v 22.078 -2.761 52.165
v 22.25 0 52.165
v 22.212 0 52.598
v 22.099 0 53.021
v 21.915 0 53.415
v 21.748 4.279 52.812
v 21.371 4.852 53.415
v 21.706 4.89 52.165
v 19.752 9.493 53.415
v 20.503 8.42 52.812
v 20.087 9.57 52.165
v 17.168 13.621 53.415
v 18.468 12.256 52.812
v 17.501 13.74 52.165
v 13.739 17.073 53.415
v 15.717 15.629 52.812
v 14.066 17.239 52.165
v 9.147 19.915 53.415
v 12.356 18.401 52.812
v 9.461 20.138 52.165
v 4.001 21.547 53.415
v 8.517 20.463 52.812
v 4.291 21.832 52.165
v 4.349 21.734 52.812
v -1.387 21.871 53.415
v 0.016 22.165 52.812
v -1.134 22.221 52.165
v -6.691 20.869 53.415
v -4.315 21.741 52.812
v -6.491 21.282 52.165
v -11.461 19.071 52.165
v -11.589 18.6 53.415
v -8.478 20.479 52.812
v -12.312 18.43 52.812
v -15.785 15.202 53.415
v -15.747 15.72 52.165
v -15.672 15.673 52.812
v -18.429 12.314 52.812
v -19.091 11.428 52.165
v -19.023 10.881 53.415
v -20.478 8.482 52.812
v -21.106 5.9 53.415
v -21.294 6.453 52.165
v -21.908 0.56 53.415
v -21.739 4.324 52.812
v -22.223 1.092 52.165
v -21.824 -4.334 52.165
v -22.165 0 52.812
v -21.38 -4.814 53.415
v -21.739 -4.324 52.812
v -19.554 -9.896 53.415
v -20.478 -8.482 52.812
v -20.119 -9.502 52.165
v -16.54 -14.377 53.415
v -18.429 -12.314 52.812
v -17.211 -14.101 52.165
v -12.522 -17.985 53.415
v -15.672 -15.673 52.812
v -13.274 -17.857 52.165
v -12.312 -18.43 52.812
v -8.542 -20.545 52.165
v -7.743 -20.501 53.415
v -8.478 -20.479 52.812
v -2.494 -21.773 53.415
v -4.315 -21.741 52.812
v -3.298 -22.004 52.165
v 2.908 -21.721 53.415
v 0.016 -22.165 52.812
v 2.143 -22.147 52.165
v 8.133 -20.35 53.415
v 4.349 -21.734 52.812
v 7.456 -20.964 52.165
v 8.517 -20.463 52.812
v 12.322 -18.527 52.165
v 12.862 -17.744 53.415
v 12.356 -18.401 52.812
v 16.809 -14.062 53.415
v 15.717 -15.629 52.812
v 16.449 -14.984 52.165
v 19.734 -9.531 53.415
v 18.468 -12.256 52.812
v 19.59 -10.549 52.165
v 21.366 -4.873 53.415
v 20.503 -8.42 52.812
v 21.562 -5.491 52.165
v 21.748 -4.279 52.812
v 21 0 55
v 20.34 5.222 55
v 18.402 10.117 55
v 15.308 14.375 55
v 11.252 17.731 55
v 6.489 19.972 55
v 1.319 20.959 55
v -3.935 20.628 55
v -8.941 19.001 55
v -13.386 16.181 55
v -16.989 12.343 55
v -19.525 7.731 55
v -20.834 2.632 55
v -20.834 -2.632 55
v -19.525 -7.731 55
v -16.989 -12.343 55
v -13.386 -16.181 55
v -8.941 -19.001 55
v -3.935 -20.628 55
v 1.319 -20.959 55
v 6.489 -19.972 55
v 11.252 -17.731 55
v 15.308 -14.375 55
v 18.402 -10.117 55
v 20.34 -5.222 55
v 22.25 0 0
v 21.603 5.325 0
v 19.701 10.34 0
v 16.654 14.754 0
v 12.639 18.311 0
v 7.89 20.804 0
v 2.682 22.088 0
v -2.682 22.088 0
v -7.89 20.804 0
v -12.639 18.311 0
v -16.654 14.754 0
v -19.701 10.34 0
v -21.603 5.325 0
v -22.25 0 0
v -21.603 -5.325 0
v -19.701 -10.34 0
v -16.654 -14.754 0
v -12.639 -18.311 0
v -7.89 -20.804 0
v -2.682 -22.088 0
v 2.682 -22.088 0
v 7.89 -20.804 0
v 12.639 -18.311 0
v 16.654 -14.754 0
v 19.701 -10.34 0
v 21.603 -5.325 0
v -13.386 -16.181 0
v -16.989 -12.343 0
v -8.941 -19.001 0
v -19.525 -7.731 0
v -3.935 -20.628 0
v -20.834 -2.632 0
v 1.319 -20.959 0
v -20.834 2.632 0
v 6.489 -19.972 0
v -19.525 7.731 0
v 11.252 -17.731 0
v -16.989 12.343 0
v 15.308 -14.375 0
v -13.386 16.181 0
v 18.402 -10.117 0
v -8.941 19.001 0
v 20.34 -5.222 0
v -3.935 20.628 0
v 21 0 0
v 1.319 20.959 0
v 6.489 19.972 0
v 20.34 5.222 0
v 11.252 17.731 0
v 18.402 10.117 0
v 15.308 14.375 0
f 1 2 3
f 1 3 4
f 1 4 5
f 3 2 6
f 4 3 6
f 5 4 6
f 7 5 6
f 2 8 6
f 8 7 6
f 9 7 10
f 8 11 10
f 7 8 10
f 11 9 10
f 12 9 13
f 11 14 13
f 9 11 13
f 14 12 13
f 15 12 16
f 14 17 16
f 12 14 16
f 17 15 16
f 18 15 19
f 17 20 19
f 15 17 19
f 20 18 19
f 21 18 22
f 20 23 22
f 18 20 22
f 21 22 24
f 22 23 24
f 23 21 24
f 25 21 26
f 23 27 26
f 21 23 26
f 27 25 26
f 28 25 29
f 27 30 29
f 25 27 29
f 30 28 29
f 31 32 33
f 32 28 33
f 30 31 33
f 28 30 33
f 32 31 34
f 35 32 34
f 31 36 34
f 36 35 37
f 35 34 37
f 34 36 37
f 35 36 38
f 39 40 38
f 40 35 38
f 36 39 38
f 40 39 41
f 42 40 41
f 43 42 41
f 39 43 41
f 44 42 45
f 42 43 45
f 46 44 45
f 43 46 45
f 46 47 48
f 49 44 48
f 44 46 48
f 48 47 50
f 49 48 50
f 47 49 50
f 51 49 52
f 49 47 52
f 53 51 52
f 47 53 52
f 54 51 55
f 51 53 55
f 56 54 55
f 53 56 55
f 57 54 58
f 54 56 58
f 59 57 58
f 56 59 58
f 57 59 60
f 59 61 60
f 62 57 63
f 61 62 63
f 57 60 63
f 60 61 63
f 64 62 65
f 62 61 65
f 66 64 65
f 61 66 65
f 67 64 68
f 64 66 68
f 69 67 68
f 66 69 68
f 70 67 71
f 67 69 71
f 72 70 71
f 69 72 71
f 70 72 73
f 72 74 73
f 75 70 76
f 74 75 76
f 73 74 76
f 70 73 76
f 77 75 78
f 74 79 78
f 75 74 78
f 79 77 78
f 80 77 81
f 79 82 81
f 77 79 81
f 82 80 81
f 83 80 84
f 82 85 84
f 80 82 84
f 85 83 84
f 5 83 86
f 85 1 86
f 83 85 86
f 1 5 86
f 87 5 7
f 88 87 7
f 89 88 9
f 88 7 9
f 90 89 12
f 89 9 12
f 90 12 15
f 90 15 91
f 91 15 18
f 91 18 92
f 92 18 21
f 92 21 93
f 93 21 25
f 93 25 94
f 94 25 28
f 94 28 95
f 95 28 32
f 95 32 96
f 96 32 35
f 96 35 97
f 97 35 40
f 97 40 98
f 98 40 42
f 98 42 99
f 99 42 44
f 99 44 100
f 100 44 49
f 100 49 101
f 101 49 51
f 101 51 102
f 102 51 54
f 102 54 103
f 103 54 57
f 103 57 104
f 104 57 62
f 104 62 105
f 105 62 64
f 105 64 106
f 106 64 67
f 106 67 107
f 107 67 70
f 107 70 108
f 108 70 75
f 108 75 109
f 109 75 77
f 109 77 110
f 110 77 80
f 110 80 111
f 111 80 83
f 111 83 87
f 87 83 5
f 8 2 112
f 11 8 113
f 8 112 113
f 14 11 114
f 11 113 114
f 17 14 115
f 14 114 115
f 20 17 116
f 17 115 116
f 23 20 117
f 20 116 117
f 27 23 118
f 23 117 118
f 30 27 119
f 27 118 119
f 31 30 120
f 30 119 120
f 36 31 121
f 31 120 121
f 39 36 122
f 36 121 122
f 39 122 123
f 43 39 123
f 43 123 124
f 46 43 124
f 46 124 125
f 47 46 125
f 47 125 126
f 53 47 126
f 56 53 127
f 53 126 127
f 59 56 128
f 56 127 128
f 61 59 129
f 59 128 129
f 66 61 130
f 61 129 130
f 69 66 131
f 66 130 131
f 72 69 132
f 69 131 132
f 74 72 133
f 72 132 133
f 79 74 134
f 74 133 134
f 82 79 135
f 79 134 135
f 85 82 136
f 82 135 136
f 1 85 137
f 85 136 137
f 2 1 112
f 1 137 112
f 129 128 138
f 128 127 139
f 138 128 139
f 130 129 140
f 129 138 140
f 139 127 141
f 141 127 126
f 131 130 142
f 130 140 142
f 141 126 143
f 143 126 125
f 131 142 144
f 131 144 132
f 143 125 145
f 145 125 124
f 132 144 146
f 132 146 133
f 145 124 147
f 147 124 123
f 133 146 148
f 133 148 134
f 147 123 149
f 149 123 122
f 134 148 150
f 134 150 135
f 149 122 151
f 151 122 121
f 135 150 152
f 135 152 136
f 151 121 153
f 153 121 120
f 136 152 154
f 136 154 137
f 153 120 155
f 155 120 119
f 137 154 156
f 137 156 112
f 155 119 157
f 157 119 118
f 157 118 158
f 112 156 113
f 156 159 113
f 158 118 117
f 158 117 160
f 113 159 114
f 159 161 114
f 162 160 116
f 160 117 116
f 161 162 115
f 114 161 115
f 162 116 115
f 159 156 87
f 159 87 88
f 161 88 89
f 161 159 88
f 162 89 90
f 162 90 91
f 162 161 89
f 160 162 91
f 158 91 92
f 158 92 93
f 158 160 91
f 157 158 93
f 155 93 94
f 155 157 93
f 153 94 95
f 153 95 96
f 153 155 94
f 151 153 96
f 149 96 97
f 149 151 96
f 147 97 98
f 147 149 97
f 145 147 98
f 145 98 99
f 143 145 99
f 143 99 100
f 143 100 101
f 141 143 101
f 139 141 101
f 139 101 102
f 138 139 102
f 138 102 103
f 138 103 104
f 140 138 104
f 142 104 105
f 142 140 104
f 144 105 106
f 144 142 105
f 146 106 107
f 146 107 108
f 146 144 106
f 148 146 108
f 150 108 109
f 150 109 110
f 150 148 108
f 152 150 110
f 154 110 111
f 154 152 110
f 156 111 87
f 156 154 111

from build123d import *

# Parameters (mm, degrees)
F0_R     = 22.25
F0_R_2   = 21
F1_DEPTH = 55
F2_SIZE2 = 2.165054
F2_SIZE  = 1.24999
F3_R     = 2.5


# Not quite as in the source:
# - a fillet or chamfer is up to 0.001 mm smaller than in the source, because OpenCascade refuses the exact size


with BuildPart() as f1:
    # F0 (on Top) → F1 (new body)
    with BuildSketch(Plane.XY):
        Circle(F0_R)
        Circle(F0_R_2, mode=Mode.SUBTRACT)
    extrude(amount=F1_DEPTH)

    # F2 (size 1.25 and 2.1650635095 in the source; OpenCascade refuses exactly that, so slightly less here)
    f2_edges = [f1.edges().sort_by_distance(p)[0] for p in [
        (-22.25, 0, 55),
    ]]
    f2_side = f1.faces().sort_by_distance((-21.620675, 0, 55))[0]
    chamfer(f2_edges, length=F2_SIZE, length2=F2_SIZE2, reference=f2_side)

    # F3
    f3_edges = [f1.edges().sort_by_distance(p)[0] for p in [
        (-22.25, 0, 52.834946),
    ]]
    fillet(f3_edges, radius=F3_R)


solid = f1.part
